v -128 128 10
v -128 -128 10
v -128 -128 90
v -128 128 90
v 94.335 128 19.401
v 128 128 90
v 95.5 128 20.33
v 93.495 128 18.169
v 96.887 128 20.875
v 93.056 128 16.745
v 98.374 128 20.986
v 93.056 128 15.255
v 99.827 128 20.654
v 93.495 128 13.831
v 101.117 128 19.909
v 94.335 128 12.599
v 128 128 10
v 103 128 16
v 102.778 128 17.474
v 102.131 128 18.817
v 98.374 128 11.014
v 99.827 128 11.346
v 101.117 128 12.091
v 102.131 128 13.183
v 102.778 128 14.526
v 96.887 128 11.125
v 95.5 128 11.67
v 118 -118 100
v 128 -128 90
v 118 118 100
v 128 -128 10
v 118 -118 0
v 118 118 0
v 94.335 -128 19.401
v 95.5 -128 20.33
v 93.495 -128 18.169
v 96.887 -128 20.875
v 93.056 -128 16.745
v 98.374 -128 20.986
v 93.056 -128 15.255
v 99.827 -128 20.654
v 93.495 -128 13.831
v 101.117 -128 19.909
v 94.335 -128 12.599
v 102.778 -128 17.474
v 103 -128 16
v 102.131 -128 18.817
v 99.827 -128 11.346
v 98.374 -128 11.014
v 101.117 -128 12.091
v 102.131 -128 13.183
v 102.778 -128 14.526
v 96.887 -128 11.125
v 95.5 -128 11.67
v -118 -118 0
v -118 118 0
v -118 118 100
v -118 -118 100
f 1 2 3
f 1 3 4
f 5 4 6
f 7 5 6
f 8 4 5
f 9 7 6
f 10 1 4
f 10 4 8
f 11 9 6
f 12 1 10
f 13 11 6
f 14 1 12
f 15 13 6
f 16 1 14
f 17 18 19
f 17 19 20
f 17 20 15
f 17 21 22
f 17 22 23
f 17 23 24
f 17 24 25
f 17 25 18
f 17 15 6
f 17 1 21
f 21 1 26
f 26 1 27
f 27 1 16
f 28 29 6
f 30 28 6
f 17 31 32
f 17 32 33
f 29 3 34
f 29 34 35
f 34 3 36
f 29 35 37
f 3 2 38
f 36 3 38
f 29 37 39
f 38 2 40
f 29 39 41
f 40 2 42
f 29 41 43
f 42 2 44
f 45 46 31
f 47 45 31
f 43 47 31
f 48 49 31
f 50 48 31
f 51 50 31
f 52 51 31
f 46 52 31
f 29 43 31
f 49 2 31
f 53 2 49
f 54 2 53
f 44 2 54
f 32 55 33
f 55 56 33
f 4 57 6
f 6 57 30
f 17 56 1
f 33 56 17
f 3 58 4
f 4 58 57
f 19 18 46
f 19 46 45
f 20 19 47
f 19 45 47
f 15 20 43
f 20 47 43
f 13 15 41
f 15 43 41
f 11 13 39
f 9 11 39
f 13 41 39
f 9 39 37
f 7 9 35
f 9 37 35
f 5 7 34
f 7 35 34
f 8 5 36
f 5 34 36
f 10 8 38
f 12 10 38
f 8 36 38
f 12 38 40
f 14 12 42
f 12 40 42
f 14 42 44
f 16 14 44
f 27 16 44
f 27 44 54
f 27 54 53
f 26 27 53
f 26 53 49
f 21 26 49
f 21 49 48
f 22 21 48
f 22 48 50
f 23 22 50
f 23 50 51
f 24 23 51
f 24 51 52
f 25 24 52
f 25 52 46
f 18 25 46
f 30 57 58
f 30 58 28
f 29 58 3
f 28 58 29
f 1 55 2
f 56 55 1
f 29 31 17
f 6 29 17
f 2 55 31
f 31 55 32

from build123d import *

# Parameters (mm, degrees)
SKETCH_1_W          = 256
SKETCH_1_H          = 256
EXTRUDE_1_DEPTH     = 100
SKETCH_2_R          = 5
CUT_EXTRUDE_1_DEPTH = 257
CHAMFER_1_SIZE      = 10


with BuildPart() as part:
    # 草圖1 → 填料-伸長1 (new body)
    with BuildSketch(Plane.XY):
        Rectangle(SKETCH_1_W, SKETCH_1_H)
    extrude(amount=EXTRUDE_1_DEPTH)

    # 草圖2 → 除料-伸長1 (cut, through all)
    with BuildSketch(Plane.XZ.offset(128)):
        with Locations((98, 16)):
            Circle(SKETCH_2_R)
    extrude(amount=-CUT_EXTRUDE_1_DEPTH, mode=Mode.SUBTRACT)

    # 導角1
    chamfer_1_edges = [part.edges().sort_by_distance(p)[0] for p in [
        (-128, 0, 100),
        (0, -128, 100),
        (128, 0, 100),
        (0, -128, 0),
        (-128, 0, 0),
        (0, 128, 0),
        (128, 0, 0),
        (0, 128, 100),
    ]]
    chamfer(chamfer_1_edges, length=CHAMFER_1_SIZE)


solid = part.part
